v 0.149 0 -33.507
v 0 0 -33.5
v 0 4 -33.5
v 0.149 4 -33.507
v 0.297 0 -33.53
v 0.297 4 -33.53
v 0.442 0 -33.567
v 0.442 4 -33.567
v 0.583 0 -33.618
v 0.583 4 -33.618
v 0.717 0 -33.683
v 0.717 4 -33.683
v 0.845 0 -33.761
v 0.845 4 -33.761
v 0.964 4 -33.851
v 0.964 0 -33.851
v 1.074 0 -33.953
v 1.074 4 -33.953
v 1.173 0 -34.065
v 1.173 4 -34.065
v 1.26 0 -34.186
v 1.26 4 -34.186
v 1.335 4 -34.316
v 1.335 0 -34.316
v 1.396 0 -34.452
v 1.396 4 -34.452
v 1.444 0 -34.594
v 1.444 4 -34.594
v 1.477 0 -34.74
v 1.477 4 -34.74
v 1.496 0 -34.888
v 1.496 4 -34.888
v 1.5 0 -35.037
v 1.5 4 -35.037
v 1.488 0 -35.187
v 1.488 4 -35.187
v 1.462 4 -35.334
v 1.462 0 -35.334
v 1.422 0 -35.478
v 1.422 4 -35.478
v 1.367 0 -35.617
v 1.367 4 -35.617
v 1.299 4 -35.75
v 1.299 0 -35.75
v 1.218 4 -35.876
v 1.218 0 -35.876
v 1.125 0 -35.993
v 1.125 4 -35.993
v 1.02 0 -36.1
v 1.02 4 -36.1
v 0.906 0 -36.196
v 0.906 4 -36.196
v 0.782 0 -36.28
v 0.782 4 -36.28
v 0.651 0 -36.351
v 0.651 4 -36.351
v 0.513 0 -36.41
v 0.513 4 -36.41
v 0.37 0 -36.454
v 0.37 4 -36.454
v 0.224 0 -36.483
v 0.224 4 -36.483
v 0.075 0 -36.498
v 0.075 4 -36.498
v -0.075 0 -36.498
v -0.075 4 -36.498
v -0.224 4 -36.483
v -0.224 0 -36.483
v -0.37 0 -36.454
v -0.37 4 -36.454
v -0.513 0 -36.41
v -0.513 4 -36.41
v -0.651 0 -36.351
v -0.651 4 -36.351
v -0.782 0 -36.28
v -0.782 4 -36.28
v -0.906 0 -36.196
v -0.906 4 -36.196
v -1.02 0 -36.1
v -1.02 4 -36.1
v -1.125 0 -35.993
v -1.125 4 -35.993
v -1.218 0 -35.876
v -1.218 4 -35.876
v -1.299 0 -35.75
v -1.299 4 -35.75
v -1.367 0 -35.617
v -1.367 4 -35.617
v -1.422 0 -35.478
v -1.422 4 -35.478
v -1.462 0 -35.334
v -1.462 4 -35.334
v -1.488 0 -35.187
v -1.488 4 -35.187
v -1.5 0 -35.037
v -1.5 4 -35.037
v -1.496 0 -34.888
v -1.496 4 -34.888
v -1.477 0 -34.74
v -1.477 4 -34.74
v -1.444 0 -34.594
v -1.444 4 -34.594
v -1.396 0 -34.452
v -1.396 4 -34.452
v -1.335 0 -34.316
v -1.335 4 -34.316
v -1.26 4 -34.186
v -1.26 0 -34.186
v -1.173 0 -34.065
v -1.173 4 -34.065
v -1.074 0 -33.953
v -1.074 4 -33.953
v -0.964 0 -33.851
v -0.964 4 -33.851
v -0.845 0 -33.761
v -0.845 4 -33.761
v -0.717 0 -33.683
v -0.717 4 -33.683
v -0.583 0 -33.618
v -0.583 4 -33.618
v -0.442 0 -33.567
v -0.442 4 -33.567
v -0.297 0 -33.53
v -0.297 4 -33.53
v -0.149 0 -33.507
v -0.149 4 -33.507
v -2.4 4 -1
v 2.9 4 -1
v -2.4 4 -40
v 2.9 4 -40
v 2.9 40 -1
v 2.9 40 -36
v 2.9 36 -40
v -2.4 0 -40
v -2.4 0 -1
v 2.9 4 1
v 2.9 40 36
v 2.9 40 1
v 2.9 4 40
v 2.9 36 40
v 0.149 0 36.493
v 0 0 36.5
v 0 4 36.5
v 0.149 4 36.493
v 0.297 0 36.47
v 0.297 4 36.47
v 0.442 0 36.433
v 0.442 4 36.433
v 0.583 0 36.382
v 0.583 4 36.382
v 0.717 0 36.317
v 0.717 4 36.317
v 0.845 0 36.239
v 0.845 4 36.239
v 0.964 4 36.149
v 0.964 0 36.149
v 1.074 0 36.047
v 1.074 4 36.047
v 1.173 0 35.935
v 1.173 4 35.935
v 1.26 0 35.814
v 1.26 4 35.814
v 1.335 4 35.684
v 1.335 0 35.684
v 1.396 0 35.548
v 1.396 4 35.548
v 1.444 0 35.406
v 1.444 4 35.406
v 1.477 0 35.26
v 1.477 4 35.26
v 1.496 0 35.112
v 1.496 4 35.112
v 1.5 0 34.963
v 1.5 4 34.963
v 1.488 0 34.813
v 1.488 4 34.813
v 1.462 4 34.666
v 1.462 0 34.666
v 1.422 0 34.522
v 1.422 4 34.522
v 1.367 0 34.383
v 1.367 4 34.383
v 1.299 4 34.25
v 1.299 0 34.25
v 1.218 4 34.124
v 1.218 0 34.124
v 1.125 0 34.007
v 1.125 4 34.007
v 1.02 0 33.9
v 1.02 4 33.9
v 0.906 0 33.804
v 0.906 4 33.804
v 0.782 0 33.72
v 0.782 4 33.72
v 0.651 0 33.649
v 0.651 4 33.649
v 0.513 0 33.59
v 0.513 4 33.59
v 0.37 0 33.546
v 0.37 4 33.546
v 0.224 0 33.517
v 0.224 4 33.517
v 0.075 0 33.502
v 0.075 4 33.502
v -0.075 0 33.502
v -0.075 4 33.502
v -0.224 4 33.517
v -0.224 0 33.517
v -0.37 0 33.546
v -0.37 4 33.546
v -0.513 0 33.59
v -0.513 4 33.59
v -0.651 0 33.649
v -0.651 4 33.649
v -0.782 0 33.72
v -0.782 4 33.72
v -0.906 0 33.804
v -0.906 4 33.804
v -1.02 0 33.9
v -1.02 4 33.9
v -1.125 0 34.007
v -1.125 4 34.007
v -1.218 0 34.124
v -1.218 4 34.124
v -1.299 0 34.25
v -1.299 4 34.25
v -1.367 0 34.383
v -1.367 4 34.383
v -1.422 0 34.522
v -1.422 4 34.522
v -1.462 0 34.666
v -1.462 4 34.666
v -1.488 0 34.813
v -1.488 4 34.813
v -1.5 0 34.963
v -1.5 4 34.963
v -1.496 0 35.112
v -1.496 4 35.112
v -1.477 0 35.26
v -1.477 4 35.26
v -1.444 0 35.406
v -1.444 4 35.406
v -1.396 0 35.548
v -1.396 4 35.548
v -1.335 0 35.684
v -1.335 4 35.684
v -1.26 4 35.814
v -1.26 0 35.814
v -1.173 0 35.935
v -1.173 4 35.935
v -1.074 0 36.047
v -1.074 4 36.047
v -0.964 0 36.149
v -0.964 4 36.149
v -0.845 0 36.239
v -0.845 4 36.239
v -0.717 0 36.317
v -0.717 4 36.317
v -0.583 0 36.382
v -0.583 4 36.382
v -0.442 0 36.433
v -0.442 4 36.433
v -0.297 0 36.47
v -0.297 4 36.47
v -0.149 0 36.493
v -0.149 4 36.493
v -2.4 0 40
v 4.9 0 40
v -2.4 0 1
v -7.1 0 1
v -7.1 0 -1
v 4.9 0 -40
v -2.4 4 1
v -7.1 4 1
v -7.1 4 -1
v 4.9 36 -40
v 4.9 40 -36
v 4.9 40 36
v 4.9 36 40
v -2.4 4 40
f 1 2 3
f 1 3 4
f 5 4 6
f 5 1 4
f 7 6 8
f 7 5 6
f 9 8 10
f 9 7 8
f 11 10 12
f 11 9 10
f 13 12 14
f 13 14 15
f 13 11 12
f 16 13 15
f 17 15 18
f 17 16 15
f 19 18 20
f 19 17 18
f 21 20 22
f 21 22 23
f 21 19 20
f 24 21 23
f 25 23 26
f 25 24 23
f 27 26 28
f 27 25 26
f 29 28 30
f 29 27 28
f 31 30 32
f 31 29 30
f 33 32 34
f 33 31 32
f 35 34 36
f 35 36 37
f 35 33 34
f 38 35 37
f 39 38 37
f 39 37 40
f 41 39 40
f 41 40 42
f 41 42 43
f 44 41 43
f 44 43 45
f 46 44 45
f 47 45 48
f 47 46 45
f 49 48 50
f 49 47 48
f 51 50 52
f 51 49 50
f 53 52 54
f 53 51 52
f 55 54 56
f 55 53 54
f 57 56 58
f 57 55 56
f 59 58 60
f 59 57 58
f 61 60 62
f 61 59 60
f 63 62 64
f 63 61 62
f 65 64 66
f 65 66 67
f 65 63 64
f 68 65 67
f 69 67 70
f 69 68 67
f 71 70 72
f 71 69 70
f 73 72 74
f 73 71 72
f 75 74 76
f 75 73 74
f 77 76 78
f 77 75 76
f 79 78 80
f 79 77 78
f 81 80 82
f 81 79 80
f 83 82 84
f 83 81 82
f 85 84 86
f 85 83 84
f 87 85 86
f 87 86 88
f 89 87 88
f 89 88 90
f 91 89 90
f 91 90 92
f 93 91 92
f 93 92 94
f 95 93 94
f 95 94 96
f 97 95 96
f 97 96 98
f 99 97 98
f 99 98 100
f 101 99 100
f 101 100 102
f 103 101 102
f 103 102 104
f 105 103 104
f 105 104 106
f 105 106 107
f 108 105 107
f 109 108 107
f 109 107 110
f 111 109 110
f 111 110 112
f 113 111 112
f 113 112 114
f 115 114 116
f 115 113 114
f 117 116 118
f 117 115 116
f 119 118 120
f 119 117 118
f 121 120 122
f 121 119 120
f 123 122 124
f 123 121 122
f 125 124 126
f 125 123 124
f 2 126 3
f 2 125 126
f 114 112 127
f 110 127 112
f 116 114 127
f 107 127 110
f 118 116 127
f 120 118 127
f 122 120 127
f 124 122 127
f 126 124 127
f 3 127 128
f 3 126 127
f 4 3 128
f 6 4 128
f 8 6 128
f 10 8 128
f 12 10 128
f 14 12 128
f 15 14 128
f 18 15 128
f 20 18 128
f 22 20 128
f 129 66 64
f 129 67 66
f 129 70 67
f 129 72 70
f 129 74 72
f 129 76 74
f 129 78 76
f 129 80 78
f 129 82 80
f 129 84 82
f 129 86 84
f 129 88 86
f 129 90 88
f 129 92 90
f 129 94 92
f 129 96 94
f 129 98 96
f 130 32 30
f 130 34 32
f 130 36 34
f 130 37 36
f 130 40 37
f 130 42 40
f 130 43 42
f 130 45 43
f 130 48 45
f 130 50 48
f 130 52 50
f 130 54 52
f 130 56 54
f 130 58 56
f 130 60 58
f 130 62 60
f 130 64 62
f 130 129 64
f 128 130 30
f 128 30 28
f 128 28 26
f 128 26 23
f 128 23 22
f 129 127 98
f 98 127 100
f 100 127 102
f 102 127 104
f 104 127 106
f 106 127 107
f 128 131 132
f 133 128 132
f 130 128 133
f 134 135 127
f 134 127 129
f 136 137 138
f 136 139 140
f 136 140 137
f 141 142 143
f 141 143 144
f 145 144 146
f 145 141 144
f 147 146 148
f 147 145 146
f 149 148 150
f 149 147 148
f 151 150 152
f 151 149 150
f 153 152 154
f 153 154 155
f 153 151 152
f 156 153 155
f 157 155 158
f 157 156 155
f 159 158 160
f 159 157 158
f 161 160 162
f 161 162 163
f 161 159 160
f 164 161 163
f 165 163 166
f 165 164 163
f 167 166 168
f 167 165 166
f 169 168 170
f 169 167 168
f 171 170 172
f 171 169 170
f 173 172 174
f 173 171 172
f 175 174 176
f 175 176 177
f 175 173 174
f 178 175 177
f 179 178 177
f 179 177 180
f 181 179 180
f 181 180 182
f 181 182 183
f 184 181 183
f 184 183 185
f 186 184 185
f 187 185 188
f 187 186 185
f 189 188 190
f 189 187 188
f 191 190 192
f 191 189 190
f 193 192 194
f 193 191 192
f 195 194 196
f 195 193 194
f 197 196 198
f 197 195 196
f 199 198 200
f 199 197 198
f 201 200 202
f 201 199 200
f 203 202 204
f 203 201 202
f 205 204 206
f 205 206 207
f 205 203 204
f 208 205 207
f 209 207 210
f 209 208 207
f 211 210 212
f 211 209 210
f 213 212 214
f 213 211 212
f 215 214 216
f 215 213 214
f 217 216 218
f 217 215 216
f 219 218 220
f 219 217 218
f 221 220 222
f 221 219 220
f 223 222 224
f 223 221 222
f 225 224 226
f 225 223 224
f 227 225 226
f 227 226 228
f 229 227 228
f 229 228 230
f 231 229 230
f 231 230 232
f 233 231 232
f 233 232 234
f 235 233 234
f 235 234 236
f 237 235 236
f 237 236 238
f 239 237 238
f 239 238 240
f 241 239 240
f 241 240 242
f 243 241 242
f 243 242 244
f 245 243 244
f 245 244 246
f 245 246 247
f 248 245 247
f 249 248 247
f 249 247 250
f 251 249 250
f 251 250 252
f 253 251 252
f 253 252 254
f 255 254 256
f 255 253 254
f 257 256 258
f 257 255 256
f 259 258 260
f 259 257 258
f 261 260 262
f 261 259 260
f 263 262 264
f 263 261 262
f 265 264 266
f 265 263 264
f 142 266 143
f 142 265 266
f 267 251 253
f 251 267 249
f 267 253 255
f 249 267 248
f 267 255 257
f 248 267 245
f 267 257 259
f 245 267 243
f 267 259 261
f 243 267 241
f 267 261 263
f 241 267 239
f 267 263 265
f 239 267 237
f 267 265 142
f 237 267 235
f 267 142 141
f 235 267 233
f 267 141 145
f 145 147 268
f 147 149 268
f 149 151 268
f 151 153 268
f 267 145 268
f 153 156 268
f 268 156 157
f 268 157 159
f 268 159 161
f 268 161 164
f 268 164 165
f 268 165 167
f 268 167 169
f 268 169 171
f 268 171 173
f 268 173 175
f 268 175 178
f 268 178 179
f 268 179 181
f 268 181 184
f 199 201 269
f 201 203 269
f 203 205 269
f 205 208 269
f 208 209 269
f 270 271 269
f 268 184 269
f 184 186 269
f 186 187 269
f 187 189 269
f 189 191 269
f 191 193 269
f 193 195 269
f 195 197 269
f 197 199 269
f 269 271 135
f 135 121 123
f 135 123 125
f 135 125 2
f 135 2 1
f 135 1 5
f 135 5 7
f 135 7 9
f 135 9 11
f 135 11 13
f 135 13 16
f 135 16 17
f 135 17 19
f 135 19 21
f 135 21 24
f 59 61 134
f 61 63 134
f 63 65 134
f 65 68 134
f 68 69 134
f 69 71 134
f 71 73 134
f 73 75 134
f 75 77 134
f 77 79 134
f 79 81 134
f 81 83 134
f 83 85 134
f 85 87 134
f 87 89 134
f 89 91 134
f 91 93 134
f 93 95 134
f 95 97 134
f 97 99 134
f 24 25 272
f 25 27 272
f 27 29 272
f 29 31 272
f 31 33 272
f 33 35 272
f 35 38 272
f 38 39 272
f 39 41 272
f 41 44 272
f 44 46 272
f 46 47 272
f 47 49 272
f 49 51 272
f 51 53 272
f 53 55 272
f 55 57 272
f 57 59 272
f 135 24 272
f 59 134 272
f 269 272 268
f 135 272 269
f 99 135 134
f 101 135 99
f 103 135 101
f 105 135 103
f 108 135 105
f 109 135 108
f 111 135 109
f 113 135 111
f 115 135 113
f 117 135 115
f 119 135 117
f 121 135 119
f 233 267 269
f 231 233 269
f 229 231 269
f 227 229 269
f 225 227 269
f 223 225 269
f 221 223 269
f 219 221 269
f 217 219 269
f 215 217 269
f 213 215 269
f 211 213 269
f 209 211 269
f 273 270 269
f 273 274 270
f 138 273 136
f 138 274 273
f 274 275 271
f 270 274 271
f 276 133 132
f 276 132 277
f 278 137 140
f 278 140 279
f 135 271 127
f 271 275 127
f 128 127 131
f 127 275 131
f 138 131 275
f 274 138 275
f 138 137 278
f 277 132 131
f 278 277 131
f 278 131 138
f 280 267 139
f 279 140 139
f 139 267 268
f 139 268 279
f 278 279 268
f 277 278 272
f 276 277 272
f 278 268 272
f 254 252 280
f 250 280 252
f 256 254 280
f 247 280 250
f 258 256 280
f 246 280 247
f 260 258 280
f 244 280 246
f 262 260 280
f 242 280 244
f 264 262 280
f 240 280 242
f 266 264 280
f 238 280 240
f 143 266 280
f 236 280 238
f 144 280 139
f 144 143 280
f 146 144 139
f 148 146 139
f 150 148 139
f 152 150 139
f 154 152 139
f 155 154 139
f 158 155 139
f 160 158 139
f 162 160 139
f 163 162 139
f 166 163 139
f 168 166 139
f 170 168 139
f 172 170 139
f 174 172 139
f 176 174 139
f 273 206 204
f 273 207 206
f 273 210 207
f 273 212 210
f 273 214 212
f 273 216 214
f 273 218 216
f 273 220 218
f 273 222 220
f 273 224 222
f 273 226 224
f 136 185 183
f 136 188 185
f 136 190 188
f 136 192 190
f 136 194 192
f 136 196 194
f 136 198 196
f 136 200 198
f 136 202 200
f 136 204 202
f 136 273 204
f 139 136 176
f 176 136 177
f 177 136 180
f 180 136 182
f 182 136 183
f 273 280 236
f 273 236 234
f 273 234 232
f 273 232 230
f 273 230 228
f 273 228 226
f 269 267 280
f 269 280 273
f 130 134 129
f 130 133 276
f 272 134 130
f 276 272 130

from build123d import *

# Parameters (mm, degrees)
SKETCH_1_W      = 7.3
SKETCH_1_H      = 80
SKETCH_1_R      = 1.5
EXTRUDE_1_DEPTH = 4
SKETCH_1_4_W    = 2
SKETCH_1_4_H    = 80
EXTRUDE_3_DEPTH = 40
EXTRUDE_4_DEPTH = 1
CHAMFER_1_SIZE  = 4


with BuildPart() as part:
    # 草图1 → 凸台-拉伸1 (new body)
    with BuildSketch(Plane(origin=(0, 0, 0), x_dir=(1, 0, 0), z_dir=(0, 1, 0))):
        with Locations((1.25, 0)):
            Rectangle(SKETCH_1_W, SKETCH_1_H)
        with Locations((0, 35)):
            Circle(SKETCH_1_R, mode=Mode.SUBTRACT)
        with Locations((0, -35)):
            Circle(SKETCH_1_R, mode=Mode.SUBTRACT)
    extrude(amount=EXTRUDE_1_DEPTH)

    # 草图1<4> → 凸台-拉伸3 (add)
    with BuildSketch(Plane(origin=(0, 0, 0), x_dir=(1, 0, 0), z_dir=(0, 1, 0))):
        with Locations((3.9, 0)):
            Rectangle(SKETCH_1_4_W, SKETCH_1_4_H)
    extrude(amount=EXTRUDE_3_DEPTH)

    # 草图2 → 凸台-拉伸4 (add, symmetric)
    with BuildSketch(Plane.XY):
        Polygon((2.9, 0), (2.9, 40), (-7.1, 4), (-7.1, 0), align=None)
    extrude(amount=EXTRUDE_4_DEPTH, both=True)

    # 倒角1
    chamfer_1_edges = [part.edges().sort_by_distance(p)[0] for p in [
        (3.9, 40, 40),
        (3.9, 40, -40),
    ]]
    chamfer(chamfer_1_edges, length=CHAMFER_1_SIZE)


solid = part.part
